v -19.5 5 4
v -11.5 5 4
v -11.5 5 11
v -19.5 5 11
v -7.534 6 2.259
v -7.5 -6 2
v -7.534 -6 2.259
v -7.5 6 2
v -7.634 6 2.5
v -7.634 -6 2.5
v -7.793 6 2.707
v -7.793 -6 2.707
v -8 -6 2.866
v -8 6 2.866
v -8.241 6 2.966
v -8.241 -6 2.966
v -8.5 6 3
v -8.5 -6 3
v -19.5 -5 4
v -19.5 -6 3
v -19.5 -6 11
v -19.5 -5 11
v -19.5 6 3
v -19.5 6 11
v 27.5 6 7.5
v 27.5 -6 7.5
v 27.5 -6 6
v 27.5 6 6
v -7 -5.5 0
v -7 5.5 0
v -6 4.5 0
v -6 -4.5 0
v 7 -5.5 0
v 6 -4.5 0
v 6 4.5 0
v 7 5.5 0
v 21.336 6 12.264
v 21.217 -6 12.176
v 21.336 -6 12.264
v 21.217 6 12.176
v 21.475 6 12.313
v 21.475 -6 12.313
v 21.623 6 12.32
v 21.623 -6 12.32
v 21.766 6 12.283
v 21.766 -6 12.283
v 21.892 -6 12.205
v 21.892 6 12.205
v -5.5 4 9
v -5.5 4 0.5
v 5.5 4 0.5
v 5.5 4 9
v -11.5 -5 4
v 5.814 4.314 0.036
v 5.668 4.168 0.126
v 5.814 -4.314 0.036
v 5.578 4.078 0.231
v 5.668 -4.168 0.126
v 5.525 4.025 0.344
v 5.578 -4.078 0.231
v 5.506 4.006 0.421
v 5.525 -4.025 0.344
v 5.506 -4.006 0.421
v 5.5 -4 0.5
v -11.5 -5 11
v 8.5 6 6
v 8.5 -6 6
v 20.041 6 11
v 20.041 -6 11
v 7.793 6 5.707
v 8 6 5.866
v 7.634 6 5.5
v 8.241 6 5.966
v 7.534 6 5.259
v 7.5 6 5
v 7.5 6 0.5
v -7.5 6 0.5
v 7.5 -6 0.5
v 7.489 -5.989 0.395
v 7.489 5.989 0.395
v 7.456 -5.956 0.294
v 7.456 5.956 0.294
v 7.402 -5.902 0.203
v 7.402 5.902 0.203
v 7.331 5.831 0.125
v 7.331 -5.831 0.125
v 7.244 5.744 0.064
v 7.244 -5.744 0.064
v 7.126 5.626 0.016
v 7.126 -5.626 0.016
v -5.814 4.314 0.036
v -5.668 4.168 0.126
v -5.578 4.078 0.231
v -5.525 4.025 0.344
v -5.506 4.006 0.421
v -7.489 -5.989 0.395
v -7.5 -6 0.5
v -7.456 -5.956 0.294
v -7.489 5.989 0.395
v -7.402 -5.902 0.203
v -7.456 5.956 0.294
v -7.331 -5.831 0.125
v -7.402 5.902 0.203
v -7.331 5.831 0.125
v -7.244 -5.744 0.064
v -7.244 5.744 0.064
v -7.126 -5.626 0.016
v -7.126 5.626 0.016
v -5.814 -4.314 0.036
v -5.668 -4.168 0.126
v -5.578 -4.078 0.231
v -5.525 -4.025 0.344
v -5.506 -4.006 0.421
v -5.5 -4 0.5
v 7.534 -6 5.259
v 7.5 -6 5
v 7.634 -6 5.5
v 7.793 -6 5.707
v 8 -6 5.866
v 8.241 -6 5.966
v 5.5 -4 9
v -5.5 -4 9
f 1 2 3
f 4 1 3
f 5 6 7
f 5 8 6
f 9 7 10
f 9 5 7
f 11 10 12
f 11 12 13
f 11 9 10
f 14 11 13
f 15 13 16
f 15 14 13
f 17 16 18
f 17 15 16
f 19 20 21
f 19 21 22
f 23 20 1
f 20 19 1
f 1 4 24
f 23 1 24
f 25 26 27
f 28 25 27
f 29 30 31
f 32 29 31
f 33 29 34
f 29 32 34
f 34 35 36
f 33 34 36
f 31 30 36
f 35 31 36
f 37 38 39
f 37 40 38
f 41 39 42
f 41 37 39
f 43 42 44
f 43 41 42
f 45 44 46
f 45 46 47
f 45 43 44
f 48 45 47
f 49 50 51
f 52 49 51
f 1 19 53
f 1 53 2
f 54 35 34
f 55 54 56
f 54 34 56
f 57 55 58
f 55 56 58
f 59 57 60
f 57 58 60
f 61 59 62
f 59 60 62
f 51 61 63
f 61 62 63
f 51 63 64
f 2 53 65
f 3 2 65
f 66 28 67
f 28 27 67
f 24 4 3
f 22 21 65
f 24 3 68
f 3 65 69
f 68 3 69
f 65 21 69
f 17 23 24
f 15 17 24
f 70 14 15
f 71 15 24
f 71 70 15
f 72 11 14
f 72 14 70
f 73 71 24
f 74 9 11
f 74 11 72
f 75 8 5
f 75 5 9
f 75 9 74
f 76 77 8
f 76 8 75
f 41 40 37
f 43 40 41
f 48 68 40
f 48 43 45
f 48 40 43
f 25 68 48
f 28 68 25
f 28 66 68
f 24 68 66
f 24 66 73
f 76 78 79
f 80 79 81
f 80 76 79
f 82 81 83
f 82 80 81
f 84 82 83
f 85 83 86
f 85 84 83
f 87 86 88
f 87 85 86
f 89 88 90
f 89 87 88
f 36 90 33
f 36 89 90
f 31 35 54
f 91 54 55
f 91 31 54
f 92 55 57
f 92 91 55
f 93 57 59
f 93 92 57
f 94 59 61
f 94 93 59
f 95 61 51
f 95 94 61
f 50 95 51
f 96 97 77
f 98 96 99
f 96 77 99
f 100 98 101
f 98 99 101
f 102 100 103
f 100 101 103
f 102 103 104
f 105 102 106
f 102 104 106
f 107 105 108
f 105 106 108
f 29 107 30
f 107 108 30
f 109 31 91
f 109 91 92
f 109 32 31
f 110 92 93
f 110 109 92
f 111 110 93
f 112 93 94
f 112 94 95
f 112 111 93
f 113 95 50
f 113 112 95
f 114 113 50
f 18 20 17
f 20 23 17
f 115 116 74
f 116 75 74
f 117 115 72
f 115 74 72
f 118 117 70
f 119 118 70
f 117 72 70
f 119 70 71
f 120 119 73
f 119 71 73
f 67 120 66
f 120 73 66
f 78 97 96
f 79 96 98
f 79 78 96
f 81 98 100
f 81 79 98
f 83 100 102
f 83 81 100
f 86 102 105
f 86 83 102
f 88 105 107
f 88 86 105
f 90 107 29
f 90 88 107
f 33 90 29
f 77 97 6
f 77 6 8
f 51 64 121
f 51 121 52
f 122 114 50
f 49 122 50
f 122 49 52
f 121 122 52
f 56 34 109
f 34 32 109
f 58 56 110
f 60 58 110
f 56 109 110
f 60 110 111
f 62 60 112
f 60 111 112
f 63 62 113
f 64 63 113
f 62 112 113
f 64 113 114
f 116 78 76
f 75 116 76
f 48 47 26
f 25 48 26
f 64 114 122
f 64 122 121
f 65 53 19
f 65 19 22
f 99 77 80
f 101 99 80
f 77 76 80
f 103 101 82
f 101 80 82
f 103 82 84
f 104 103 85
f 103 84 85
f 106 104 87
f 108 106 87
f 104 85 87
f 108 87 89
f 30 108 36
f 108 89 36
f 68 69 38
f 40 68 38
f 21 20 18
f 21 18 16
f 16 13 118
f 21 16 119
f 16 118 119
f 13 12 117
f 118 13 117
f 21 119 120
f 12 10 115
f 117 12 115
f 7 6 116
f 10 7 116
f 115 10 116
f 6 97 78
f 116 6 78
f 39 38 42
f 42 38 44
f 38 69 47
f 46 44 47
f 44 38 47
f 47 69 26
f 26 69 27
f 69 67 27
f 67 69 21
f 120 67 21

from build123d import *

# Parameters (mm, degrees)
SKETCH_1_W           = 15
SKETCH_1_H           = 12
EXTRUDE_1_DEPTH      = 11
SHELL_1_T            = -2
SKETCH_2_W           = 12
SKETCH_2_H           = 12
EXTRUDE_2_DEPTH      = 8
SKETCH_3_W           = 7
SKETCH_3_H           = 10
CUT_EXTRUDE_1_DEPTH  = 8
FILLET_1_R           = 0.5
SKETCH_4_W           = 5
SKETCH_4_H           = 12
EXTRUDE_3_DEPTH      = 5
EXTRUDE_4_DEPTH      = 6
EXTRUDE_4_DEPTH_BACK = 6
FILLET_2_R           = 1
FILLET_3_R           = 1
FILLET_4_R           = 0.5


with BuildPart() as part:
    # 草图1 → 凸台-拉伸1 (new body)
    with BuildSketch(Plane.XY):
        Rectangle(SKETCH_1_W, SKETCH_1_H)
    extrude(amount=EXTRUDE_1_DEPTH)

    # 抽壳1
    shell_1_openings = [part.faces().sort_by_distance(p)[0] for p in [
        (0, 0, 0),
    ]]
    offset(amount=SHELL_1_T, openings=shell_1_openings, kind=Kind.INTERSECTION)

    # 草图2 → 凸台-拉伸2 (add)
    with BuildSketch(Plane.XY.offset(11)):
        with Locations((-13.5, 0)):
            Rectangle(SKETCH_2_W, SKETCH_2_H)
    extrude(amount=-EXTRUDE_2_DEPTH)

    # 草图3 → 切除-拉伸1 (cut)
    with BuildSketch(Plane.ZY.offset(19.5)):
        with Locations((7.5, 0)):
            Rectangle(SKETCH_3_W, SKETCH_3_H)
    extrude(amount=-CUT_EXTRUDE_1_DEPTH, mode=Mode.SUBTRACT)

    # 圆角1
    fillet_1_edges = [part.edges().sort_by_distance(p)[0] for p in [
        (5.5, 0, 0),
        (0, 4, 0),
        (-5.5, 0, 0),
        (0, -4, 0),
        (0, -6, 0),
        (-7.5, 0, 0),
        (0, 6, 0),
        (7.5, 0, 0),
    ]]
    fillet(fillet_1_edges, radius=FILLET_1_R)

    # 草图4 → 凸台-拉伸3 (add)
    with BuildSketch(Plane.XY.offset(11)):
        with Locations((10, 0)):
            Rectangle(SKETCH_4_W, SKETCH_4_H)
    extrude(amount=-EXTRUDE_3_DEPTH)

    # 草图5 → 凸台-拉伸4 (add, two sides: drawn at the far end of the back side and taken through both)
    with BuildSketch(Plane(origin=(0, 0, 0), x_dir=(1, 0, 0), z_dir=(0, 1, 0)).offset(-EXTRUDE_4_DEPTH_BACK)):
        Polygon((21.541232037, -12.5), (27.5, -7.5), (27.5, -6), (20.041232037, -6), (12.5, -6), (12.5, -11), (20.041232037, -11), align=None)
    extrude(amount=EXTRUDE_4_DEPTH + EXTRUDE_4_DEPTH_BACK)

    # 圆角2
    fillet_2_edges = [part.edges().sort_by_distance(p)[0] for p in [
        (7.5, 0, 6),
    ]]
    fillet(fillet_2_edges, radius=FILLET_2_R)

    # 圆角3
    fillet_3_edges = [part.edges().sort_by_distance(p)[0] for p in [
        (-7.5, 0, 3),
    ]]
    fillet(fillet_3_edges, radius=FILLET_3_R)

    # 圆角4
    fillet_4_edges = [part.edges().sort_by_distance(p)[0] for p in [
        (21.541232037, 0, 12.5),
    ]]
    fillet(fillet_4_edges, radius=FILLET_4_R)


solid = part.part
